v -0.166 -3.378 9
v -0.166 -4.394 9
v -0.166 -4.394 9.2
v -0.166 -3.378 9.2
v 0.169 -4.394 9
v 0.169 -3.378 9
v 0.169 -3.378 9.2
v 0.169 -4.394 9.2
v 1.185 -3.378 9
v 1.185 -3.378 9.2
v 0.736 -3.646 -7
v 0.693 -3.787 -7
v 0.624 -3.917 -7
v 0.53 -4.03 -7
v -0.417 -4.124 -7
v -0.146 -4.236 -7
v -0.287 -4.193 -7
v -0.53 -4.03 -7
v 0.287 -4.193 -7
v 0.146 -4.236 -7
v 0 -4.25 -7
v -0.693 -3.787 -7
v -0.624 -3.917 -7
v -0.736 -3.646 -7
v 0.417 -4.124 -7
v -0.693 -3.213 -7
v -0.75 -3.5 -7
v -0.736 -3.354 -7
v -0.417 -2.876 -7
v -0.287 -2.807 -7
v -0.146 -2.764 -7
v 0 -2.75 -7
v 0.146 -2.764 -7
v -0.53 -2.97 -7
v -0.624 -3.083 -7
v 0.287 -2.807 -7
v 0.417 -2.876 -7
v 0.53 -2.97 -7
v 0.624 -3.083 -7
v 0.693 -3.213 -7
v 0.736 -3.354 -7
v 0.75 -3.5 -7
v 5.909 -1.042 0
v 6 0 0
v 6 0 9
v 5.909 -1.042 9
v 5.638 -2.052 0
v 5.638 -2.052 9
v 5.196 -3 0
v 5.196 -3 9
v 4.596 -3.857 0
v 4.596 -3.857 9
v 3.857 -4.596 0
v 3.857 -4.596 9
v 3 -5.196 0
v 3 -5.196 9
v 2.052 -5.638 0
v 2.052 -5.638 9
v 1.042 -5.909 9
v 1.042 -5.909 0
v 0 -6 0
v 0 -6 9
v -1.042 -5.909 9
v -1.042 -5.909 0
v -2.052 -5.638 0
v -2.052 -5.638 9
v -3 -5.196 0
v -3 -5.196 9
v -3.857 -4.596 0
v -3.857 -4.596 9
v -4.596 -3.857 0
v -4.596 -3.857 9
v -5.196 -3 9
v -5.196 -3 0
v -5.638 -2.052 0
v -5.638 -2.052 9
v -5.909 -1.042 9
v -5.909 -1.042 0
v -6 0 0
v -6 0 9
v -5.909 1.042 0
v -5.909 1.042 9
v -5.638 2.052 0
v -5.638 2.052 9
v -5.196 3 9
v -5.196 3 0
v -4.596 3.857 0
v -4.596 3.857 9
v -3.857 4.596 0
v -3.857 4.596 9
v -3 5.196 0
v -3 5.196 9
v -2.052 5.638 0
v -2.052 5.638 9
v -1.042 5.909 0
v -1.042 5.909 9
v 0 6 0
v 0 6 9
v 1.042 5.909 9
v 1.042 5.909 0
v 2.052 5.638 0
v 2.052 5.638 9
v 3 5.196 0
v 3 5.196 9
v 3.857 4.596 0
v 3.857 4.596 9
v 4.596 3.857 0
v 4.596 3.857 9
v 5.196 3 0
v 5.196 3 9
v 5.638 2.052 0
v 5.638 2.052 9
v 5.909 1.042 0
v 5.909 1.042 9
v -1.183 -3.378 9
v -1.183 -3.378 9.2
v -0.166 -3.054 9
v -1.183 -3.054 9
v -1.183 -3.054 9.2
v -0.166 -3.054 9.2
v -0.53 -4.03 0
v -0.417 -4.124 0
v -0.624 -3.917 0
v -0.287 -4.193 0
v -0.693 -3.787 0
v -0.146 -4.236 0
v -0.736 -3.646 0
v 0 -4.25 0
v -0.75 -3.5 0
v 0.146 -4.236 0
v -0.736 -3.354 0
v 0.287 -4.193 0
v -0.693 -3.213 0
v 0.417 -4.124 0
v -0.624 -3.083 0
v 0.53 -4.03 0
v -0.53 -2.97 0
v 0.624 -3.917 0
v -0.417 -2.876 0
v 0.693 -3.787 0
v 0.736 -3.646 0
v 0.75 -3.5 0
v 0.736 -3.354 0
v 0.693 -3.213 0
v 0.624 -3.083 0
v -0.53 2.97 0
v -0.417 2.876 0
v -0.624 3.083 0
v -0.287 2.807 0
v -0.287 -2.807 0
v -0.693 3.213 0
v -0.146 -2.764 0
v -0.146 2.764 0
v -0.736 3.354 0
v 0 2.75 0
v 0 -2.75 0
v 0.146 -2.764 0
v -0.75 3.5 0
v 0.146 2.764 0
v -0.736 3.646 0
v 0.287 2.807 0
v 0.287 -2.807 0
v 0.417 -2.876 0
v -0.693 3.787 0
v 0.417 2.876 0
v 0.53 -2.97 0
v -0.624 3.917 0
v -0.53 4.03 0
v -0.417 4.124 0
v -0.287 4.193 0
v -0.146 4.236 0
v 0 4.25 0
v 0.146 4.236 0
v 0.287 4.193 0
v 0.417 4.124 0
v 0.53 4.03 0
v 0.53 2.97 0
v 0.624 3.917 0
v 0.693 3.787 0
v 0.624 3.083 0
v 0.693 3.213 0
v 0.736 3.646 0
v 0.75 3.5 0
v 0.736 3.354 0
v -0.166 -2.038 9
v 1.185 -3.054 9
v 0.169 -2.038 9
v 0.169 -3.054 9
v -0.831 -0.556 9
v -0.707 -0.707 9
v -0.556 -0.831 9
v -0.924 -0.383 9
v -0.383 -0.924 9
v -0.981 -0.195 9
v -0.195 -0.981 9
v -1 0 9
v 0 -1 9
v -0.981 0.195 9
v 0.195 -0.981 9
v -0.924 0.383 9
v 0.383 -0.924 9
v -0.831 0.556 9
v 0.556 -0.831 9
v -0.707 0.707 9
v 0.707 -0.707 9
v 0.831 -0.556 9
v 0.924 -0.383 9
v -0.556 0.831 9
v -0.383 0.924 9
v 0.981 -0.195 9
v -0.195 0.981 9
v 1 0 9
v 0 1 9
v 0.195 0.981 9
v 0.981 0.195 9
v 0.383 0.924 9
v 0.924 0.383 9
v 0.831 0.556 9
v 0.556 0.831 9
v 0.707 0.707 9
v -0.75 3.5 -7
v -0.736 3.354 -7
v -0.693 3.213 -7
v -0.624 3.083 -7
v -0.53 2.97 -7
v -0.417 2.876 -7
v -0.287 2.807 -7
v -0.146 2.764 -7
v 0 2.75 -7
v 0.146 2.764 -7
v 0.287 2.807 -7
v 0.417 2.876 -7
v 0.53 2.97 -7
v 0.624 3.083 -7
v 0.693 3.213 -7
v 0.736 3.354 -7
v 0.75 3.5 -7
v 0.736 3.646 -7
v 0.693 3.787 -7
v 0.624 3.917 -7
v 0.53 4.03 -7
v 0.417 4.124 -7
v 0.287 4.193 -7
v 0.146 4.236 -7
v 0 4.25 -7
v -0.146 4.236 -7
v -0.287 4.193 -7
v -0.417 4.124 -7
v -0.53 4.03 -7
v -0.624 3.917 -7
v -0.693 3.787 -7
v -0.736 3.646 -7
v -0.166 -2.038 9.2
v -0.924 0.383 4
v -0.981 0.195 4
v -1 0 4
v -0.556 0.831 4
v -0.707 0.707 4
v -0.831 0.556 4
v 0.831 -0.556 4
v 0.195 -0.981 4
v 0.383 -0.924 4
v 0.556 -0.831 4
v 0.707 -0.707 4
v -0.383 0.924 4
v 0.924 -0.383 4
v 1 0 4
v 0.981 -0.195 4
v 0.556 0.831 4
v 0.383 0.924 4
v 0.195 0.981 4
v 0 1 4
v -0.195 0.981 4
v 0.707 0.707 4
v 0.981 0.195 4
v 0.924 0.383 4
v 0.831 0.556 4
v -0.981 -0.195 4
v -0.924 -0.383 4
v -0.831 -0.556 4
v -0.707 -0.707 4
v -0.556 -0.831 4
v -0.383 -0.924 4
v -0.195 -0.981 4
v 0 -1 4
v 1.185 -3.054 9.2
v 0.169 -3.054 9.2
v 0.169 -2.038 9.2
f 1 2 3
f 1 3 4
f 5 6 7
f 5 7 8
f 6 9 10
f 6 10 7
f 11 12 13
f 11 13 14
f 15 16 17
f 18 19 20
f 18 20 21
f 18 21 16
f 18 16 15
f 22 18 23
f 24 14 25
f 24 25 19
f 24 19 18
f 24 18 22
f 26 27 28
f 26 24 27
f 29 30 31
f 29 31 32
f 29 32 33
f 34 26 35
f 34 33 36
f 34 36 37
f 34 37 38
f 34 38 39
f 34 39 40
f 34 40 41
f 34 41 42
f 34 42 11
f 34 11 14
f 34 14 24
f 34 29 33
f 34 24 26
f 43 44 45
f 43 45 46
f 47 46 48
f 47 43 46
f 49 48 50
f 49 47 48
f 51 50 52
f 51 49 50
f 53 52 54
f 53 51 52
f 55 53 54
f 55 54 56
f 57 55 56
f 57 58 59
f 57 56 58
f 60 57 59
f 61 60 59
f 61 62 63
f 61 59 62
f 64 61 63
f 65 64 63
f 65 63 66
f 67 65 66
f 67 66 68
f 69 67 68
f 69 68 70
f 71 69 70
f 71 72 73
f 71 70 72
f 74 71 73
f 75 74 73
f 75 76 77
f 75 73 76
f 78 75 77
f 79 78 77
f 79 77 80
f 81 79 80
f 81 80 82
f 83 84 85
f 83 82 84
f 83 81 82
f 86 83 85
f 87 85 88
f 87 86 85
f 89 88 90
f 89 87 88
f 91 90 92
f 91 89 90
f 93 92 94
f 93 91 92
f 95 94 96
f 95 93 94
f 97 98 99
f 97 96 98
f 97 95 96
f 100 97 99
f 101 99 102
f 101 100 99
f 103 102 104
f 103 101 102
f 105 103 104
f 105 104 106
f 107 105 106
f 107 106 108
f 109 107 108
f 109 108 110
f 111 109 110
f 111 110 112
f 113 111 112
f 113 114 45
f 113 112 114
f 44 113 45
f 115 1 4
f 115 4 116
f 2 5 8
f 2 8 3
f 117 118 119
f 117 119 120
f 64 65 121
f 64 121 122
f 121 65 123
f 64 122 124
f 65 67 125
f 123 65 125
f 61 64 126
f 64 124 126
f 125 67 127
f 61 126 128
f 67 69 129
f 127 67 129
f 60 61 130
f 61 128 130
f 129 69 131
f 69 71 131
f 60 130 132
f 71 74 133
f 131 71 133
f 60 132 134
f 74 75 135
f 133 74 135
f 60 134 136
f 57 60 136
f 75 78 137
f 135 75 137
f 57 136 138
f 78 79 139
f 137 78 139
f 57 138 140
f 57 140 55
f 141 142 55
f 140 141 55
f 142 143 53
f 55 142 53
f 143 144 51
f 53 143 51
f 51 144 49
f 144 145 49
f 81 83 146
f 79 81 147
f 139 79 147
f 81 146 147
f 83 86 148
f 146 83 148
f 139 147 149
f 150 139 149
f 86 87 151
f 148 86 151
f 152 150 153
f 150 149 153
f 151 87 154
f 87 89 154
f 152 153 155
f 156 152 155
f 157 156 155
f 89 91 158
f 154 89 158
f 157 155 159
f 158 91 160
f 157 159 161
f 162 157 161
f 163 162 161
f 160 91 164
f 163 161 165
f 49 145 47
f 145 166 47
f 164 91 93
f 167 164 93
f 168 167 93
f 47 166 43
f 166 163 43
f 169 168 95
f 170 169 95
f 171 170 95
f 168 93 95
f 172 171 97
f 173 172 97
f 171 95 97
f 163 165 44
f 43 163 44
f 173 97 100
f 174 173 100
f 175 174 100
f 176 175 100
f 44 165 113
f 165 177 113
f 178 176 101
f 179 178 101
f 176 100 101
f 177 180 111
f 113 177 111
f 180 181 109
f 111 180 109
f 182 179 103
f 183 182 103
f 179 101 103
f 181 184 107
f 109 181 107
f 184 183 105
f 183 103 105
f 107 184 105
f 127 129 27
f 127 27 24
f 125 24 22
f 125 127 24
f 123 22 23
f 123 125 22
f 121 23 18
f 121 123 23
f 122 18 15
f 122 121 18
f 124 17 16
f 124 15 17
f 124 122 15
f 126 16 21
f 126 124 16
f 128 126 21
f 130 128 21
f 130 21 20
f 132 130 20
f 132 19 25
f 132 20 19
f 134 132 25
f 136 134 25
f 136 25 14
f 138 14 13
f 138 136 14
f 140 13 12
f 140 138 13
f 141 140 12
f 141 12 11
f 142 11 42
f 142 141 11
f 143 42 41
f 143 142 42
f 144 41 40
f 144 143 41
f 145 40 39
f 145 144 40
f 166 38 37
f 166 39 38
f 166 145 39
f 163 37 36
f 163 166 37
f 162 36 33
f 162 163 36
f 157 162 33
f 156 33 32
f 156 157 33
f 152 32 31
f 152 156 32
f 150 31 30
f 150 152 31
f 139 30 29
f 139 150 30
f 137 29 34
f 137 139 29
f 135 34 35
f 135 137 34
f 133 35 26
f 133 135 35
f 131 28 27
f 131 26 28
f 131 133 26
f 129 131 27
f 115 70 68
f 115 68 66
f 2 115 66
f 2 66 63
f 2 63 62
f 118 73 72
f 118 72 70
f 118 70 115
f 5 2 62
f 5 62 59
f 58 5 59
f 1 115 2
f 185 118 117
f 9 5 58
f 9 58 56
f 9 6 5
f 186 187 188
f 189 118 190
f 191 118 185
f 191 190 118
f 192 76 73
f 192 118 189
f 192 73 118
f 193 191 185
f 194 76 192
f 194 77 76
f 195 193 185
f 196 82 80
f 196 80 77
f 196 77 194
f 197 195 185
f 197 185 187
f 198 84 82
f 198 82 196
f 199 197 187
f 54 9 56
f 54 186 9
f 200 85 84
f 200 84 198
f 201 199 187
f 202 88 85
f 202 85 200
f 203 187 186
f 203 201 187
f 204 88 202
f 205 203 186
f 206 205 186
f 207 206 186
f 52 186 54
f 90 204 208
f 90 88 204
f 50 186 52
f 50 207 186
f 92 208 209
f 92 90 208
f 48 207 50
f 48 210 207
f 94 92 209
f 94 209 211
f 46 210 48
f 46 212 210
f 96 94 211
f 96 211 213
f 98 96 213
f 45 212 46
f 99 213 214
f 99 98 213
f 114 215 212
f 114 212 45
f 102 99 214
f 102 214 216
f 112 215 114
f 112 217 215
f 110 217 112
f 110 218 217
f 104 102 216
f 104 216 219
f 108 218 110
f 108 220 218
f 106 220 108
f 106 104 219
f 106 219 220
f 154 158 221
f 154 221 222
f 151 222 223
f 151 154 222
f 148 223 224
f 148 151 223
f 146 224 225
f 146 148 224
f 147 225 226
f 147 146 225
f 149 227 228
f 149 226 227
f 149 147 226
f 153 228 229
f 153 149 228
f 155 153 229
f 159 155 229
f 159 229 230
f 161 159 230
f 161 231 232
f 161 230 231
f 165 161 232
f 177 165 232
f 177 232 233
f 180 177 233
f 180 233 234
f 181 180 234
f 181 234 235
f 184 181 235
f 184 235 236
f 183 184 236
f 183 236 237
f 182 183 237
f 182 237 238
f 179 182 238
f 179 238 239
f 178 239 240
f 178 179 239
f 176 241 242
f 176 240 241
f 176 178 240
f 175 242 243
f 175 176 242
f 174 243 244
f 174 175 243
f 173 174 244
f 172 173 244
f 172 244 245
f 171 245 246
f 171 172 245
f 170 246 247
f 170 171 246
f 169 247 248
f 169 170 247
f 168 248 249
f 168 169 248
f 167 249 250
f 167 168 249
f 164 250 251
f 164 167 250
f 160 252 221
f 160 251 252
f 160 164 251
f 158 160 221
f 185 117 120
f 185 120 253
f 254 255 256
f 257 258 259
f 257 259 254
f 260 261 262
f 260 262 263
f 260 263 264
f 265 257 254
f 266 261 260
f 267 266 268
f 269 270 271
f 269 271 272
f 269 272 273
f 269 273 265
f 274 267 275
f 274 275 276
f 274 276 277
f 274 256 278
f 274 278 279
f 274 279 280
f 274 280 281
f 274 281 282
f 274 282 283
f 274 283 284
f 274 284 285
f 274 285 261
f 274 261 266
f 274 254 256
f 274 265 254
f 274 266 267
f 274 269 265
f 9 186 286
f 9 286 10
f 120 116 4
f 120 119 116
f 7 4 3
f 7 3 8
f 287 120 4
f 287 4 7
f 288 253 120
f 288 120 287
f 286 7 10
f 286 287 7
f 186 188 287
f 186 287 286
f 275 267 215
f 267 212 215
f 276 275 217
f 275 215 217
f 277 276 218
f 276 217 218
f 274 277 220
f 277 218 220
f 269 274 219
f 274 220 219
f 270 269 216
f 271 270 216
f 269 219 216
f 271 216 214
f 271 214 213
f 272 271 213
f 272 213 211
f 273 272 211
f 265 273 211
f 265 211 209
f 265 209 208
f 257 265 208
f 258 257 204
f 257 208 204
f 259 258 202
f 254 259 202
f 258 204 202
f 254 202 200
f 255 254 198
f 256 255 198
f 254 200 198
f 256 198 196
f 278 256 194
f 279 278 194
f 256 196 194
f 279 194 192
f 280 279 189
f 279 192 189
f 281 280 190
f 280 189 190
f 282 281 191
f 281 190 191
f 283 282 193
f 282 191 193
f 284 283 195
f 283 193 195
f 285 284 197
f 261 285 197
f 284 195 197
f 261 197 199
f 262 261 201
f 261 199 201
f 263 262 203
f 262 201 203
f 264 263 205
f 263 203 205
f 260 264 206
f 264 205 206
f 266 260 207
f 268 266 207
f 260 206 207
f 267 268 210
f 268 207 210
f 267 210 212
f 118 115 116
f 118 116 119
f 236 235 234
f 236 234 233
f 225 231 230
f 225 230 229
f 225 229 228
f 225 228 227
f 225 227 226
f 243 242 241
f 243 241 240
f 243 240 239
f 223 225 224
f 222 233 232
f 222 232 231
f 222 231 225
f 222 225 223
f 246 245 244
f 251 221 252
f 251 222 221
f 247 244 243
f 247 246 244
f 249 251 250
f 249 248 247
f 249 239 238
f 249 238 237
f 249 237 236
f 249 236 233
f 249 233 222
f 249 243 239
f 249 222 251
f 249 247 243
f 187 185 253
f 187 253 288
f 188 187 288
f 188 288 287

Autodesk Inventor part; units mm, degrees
ref_plane "YZ Plane" through (0, 0, 0) normal (1, 0, 0) x (0, 1, 0)
ref_plane "XZ Plane" through (0, 0, 0) normal (0, 1, 0) x (-1, 0, 0)
ref_plane "XY Plane" through (0, 0, 0) normal (0, 0, 1) x (1, 0, 0)
sketch "Sketch1" plane through (0, 0, 0) normal (0, 0, 1) x (1, 0, 0)
  circle A0 centre (0, 0) radius 6
  dimension "d0" = 12
extrude "Extrusion1" add sketch "Sketch1" along normal blind 9
sketch "Sketch2" plane through (0, 0, 9) normal (0, 0, 1) x (1, 0, 0)
  circle A0 centre (0, 0) radius 1
  line L0 (-2.0016, -1.6454) -> (2.0016, -1.6454) construction
  line L1 (2.0016, -1.6454) -> (2.0016, -4.7864) construction
  line L2 (2.0016, -4.7864) -> (-2.0016, -4.7864) construction
  line L3 (-2.0016, -4.7864) -> (-2.0016, -1.6454) construction
  line L4 (1.1852, -3.3776) -> (0.169, -3.3776)
  line L5 (0.169, -3.3776) -> (0.169, -4.3938)
  line L6 (0.169, -4.3938) -> (-0.1665, -4.3938)
  line L7 (-0.1665, -4.3938) -> (-0.1665, -3.3776)
  line L8 (-0.1665, -3.3776) -> (-1.1827, -3.3776)
  line L9 (-1.1827, -3.3776) -> (-1.1827, -3.0543)
  line L10 (-1.1827, -3.0543) -> (-0.1665, -3.0543)
  line L11 (-0.1665, -3.0543) -> (-0.1665, -2.0381)
  line L12 (-0.1665, -2.0381) -> (0.169, -2.0381)
  line L13 (0.169, -2.0381) -> (0.169, -3.0543)
  line L14 (0.169, -3.0543) -> (1.1852, -3.0543)
  line L15 (1.1852, -3.0543) -> (1.1852, -3.3776)
  point P0 (0, -1.6454)
  dimension "d3" = 2
extrude "Extrusion2" cut sketch "Sketch2" against normal blind 5 contours A0
extrude "Extrusion3" add sketch "Sketch2" along normal blind 0.2 contours L4 L5 L6 L7 L8 L9 L10 L11 L12 L13 L14 L15
sketch "Sketch3" plane through (0, 0, 0) normal (0, 0, -1) x (-1, 0, 0)
  circle A0 centre (0, 3.5) radius 0.75
  circle A1 centre (0, -3.5) radius 0.75
  line L0 (0, 3.5) -> (0, -3.5) construction
  point P0 (0, 0)
  point P1 (0, 0)
  dimension "d8" = 1.5
  dimension "d9" = 7
extrude "Extrusion4" add sketch "Sketch3" along normal blind 7
properties part number "Buzzer" material "PBT Plastic"
